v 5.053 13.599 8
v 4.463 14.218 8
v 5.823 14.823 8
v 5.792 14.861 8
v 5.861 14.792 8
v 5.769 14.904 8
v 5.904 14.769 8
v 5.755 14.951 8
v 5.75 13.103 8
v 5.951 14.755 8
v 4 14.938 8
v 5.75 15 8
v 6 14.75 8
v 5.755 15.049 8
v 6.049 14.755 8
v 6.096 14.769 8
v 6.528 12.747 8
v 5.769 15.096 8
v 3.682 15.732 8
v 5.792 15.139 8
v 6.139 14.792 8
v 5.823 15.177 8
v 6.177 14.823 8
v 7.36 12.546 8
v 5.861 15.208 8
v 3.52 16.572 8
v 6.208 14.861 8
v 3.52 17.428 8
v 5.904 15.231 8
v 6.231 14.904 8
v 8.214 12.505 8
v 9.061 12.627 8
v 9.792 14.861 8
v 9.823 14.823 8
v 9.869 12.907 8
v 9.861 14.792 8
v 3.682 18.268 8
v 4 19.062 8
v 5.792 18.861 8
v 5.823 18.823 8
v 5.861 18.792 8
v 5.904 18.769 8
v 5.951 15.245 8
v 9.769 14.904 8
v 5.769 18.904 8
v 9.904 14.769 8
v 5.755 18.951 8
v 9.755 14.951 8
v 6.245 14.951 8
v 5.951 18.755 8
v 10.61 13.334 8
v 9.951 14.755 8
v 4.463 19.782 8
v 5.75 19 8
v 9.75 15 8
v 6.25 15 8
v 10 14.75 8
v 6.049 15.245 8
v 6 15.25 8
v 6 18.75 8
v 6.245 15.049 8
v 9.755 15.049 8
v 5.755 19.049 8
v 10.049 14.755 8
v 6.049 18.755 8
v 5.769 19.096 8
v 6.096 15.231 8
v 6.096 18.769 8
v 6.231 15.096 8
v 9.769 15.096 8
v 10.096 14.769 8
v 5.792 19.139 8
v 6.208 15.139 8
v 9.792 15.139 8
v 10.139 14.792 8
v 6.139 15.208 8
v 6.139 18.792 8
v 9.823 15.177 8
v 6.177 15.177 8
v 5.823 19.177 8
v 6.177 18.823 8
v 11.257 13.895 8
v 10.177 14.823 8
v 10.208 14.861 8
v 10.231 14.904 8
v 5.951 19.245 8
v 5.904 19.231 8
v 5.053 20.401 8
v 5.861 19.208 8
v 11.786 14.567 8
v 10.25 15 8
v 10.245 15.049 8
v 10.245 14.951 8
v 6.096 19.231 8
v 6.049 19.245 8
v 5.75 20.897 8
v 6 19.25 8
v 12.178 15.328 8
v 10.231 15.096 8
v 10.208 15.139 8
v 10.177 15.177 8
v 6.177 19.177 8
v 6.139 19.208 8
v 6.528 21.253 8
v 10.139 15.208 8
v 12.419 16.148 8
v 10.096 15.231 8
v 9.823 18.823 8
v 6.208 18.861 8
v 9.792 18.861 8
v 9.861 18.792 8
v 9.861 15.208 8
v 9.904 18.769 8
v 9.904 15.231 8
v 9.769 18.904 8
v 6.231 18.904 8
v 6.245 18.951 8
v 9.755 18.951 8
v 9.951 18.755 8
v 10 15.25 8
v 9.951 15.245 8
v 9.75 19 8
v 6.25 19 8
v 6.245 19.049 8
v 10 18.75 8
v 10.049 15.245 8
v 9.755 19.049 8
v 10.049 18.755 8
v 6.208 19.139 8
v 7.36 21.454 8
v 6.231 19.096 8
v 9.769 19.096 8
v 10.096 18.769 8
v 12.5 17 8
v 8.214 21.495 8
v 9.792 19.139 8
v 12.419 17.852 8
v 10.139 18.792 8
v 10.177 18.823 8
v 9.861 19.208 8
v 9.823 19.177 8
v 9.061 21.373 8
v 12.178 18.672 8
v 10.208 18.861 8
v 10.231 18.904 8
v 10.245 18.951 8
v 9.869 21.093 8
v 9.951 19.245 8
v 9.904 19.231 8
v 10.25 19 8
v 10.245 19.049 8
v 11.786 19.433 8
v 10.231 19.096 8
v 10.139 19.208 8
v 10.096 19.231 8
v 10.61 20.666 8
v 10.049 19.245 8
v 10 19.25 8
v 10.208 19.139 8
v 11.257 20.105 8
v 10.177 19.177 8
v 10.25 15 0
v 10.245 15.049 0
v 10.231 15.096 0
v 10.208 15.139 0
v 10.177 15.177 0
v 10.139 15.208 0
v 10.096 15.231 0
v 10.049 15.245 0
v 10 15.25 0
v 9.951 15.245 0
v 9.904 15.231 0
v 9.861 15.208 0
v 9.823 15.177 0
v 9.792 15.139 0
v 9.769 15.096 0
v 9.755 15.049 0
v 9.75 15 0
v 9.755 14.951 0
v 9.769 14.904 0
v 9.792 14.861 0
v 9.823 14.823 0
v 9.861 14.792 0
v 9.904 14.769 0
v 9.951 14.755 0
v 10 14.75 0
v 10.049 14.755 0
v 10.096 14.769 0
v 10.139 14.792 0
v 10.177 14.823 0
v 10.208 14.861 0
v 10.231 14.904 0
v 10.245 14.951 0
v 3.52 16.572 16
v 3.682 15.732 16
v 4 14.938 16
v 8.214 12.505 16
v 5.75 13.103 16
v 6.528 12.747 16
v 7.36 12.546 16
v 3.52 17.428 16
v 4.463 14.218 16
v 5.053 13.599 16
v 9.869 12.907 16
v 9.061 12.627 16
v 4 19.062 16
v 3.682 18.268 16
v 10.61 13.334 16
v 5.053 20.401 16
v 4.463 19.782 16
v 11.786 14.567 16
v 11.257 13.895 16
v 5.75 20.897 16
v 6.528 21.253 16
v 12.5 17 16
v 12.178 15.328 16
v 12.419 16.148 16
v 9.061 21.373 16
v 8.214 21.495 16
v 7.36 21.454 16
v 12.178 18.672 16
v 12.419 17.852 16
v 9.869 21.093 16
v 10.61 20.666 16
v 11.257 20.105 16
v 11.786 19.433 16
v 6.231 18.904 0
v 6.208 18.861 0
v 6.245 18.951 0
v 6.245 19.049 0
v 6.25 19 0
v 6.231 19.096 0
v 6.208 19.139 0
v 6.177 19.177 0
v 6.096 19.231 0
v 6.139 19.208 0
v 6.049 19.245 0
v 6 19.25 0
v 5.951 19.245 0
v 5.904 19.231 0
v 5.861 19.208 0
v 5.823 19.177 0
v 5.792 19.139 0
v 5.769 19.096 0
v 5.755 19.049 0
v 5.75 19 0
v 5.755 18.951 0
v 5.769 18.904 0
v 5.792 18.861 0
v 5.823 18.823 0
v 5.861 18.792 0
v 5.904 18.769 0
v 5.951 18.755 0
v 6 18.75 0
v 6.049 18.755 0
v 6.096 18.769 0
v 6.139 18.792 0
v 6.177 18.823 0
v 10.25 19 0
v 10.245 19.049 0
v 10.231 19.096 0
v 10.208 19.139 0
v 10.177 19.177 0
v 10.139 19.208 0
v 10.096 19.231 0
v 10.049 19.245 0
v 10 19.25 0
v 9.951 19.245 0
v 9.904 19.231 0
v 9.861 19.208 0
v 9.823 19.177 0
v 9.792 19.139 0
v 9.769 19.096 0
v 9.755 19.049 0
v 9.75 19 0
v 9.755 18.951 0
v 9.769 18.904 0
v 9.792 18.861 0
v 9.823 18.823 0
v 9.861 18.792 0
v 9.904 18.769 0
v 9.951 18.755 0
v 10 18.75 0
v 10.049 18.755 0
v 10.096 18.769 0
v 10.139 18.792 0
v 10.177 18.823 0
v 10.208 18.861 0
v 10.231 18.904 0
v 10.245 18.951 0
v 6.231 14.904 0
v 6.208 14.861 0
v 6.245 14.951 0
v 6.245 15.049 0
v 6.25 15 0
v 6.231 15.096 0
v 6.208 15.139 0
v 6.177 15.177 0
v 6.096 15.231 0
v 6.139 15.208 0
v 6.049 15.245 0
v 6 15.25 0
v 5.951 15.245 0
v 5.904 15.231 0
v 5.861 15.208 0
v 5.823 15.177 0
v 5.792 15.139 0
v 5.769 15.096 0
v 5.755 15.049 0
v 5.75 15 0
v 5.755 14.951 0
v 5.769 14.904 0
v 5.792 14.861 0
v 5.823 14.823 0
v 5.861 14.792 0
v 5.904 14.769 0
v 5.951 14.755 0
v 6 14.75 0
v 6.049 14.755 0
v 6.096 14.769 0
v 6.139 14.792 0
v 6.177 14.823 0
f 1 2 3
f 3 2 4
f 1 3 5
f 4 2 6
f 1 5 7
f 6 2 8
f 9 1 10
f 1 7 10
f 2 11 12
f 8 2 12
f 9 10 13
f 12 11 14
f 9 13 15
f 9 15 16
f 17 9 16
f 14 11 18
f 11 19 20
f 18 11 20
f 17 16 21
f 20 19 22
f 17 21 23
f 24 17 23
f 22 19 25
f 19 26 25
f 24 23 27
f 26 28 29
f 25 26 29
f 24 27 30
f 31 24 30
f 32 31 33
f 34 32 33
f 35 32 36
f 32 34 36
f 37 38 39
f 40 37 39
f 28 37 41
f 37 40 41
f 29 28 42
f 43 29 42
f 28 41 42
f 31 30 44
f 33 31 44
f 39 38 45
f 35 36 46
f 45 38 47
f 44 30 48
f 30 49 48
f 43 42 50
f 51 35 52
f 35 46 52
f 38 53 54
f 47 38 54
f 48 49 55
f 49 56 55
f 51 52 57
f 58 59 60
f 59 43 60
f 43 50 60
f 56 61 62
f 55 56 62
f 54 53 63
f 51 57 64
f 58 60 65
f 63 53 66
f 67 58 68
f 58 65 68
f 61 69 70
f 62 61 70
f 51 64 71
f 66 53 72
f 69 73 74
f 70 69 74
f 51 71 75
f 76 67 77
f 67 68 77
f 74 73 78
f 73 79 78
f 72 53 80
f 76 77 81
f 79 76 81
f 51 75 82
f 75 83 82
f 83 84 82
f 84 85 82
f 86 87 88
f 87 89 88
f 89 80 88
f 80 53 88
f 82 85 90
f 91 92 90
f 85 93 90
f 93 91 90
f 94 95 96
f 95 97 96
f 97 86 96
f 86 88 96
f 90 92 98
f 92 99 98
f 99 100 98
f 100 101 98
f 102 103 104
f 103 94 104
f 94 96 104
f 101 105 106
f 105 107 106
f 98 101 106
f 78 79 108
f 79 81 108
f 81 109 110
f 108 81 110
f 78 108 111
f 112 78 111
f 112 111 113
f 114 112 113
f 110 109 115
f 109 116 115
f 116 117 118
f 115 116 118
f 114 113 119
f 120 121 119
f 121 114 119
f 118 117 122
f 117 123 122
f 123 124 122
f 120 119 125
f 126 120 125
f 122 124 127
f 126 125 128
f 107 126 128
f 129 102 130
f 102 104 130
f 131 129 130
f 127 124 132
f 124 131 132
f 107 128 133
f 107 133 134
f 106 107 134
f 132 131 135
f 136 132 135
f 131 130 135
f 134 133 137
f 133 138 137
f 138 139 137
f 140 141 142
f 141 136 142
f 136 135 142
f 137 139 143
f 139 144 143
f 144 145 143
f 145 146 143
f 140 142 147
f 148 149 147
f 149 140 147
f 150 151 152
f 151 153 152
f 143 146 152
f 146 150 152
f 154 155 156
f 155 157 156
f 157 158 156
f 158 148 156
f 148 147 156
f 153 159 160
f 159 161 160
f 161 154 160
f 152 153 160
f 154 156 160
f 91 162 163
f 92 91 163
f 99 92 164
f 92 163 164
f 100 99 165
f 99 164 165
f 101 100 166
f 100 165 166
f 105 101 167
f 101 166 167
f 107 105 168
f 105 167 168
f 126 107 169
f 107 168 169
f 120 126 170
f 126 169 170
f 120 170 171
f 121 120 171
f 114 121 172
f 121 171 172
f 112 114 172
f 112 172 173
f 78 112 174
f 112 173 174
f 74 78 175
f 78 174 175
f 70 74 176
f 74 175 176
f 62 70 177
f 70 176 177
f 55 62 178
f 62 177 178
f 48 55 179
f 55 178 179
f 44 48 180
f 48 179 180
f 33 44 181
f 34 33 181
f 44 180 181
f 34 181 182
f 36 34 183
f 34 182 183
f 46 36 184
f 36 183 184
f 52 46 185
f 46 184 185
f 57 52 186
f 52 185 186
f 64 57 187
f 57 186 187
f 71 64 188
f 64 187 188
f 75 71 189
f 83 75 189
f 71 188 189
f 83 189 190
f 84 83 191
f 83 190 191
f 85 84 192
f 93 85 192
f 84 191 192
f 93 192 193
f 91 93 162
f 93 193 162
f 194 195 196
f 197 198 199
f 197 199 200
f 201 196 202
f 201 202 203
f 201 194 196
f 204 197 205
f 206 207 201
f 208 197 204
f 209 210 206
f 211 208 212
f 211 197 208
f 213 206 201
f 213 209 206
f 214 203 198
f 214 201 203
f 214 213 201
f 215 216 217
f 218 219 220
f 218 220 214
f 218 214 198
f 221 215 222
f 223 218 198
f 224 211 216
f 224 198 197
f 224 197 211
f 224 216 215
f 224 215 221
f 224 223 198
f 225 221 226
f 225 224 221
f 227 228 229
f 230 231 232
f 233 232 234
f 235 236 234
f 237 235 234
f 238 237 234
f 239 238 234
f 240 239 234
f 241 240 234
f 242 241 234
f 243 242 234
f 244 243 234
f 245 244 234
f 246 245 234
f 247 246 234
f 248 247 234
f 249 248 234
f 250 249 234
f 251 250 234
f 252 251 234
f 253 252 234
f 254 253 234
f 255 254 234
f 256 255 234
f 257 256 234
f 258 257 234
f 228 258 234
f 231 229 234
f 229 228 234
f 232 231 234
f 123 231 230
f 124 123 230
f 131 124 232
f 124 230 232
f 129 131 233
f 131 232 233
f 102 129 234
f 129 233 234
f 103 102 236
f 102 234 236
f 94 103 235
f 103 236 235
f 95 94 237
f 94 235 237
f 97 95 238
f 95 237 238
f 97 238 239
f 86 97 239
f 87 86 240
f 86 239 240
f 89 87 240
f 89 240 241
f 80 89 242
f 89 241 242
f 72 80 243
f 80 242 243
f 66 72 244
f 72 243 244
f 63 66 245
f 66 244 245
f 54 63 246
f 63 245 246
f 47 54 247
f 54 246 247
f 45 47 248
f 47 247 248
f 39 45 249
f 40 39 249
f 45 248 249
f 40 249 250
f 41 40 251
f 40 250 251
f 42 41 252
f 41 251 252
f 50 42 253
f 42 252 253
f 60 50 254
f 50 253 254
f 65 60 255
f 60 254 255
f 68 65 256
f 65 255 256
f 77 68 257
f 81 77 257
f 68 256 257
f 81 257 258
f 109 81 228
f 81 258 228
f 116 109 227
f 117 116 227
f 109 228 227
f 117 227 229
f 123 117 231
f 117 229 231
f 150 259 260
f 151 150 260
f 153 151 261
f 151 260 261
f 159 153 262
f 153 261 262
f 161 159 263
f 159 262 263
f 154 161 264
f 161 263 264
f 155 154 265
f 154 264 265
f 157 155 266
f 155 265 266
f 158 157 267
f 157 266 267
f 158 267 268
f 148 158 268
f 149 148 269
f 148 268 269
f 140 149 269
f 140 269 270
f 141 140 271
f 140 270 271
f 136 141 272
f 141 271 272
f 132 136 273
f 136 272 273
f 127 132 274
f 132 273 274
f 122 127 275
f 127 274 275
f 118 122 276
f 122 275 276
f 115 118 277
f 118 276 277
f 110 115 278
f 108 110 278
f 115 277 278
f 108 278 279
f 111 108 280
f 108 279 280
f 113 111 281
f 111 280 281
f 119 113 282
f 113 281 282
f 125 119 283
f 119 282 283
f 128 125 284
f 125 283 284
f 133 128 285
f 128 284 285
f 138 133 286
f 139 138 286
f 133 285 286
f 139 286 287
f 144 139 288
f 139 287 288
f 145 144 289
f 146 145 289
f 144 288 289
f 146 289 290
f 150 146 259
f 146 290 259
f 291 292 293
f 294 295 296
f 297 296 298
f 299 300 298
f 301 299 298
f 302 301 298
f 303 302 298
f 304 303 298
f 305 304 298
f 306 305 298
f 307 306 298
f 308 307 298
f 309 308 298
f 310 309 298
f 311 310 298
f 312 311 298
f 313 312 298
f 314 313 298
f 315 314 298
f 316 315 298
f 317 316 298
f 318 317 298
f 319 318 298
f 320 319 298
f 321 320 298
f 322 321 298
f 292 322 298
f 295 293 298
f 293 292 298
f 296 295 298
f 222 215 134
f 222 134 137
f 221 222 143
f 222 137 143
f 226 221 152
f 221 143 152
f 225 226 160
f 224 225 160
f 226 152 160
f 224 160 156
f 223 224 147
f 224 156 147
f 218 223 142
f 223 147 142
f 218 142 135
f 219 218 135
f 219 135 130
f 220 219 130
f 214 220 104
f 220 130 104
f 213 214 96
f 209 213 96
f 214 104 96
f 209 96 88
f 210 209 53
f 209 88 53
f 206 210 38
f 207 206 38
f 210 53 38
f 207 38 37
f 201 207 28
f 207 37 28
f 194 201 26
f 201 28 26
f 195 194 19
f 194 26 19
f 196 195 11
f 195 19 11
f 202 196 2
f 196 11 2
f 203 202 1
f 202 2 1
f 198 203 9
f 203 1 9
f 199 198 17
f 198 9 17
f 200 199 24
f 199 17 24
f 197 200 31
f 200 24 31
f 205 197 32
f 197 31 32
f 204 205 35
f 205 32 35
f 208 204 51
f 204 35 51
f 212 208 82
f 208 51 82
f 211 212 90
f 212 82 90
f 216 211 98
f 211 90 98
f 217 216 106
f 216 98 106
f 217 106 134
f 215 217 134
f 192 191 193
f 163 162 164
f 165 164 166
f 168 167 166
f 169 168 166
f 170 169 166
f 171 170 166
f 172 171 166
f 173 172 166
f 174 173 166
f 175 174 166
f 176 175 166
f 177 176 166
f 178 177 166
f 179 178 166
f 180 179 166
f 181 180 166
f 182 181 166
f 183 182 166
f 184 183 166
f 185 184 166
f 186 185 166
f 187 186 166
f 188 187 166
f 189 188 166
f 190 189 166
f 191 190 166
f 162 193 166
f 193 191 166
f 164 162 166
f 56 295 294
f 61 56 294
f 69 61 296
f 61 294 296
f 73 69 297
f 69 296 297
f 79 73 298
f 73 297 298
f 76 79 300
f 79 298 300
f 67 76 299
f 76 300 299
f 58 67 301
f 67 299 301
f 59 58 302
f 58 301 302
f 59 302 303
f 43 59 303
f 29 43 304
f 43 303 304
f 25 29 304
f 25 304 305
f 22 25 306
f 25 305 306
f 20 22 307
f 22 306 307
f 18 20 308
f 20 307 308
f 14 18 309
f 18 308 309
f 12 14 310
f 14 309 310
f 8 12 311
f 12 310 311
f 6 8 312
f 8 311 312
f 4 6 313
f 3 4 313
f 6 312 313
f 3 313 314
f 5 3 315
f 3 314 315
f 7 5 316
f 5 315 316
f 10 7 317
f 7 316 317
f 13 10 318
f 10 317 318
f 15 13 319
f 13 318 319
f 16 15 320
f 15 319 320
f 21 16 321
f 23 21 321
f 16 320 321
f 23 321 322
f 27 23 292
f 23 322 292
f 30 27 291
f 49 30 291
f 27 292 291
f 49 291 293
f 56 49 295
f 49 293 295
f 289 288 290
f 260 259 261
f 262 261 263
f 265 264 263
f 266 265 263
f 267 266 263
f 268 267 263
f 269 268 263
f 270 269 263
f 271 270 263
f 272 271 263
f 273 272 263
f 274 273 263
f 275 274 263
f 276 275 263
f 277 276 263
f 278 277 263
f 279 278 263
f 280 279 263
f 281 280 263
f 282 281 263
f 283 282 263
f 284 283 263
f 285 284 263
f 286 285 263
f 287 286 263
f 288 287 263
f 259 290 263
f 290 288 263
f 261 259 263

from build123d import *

# Parameters (mm, degrees)
CYLINDER006_R     = 0.25
CYLINDER006_DEPTH = 8
CYLINDER007_R     = 0.25
CYLINDER007_DEPTH = 8
CYLINDER008_R     = 0.25
CYLINDER008_DEPTH = 8
CYLINDER009_R     = 0.25
CYLINDER009_DEPTH = 8
CYLINDER005_R     = 4.5
CYLINDER005_DEPTH = 8


with BuildPart() as cylinder006:
    # Cylinder006 → Cylinder006 (new body)
    with BuildSketch(Plane(origin=(6, 15, 0), x_dir=(1, 0, 0), z_dir=(0, 0, 1))):
        Circle(CYLINDER006_R)
    extrude(amount=CYLINDER006_DEPTH)


with BuildPart() as cylinder007:
    # Cylinder007 → Cylinder007 (new body)
    with BuildSketch(Plane(origin=(6, 19, 0), x_dir=(1, 0, 0), z_dir=(0, 0, 1))):
        Circle(CYLINDER007_R)
    extrude(amount=CYLINDER007_DEPTH)


with BuildPart() as cylinder008:
    # Cylinder008 → Cylinder008 (new body)
    with BuildSketch(Plane(origin=(10, 19, 0), x_dir=(1, 0, 0), z_dir=(0, 0, 1))):
        Circle(CYLINDER008_R)
    extrude(amount=CYLINDER008_DEPTH)


with BuildPart() as cylinder009:
    # Cylinder009 → Cylinder009 (new body)
    with BuildSketch(Plane(origin=(10, 15, 0), x_dir=(1, 0, 0), z_dir=(0, 0, 1))):
        Circle(CYLINDER009_R)
    extrude(amount=CYLINDER009_DEPTH)


with BuildPart() as capacitor:
    # Cylinder005 → Cylinder005 (new body)
    with BuildSketch(Plane(origin=(8, 17, 8), x_dir=(1, 0, 0), z_dir=(0, 0, 1))):
        Circle(CYLINDER005_R)
    extrude(amount=CYLINDER005_DEPTH)

    # Fusion001: union Cylinder006, Cylinder007, Cylinder008, Cylinder009
    add(cylinder006.part)
    add(cylinder007.part)
    add(cylinder008.part)
    add(cylinder009.part)


solid = capacitor.part
